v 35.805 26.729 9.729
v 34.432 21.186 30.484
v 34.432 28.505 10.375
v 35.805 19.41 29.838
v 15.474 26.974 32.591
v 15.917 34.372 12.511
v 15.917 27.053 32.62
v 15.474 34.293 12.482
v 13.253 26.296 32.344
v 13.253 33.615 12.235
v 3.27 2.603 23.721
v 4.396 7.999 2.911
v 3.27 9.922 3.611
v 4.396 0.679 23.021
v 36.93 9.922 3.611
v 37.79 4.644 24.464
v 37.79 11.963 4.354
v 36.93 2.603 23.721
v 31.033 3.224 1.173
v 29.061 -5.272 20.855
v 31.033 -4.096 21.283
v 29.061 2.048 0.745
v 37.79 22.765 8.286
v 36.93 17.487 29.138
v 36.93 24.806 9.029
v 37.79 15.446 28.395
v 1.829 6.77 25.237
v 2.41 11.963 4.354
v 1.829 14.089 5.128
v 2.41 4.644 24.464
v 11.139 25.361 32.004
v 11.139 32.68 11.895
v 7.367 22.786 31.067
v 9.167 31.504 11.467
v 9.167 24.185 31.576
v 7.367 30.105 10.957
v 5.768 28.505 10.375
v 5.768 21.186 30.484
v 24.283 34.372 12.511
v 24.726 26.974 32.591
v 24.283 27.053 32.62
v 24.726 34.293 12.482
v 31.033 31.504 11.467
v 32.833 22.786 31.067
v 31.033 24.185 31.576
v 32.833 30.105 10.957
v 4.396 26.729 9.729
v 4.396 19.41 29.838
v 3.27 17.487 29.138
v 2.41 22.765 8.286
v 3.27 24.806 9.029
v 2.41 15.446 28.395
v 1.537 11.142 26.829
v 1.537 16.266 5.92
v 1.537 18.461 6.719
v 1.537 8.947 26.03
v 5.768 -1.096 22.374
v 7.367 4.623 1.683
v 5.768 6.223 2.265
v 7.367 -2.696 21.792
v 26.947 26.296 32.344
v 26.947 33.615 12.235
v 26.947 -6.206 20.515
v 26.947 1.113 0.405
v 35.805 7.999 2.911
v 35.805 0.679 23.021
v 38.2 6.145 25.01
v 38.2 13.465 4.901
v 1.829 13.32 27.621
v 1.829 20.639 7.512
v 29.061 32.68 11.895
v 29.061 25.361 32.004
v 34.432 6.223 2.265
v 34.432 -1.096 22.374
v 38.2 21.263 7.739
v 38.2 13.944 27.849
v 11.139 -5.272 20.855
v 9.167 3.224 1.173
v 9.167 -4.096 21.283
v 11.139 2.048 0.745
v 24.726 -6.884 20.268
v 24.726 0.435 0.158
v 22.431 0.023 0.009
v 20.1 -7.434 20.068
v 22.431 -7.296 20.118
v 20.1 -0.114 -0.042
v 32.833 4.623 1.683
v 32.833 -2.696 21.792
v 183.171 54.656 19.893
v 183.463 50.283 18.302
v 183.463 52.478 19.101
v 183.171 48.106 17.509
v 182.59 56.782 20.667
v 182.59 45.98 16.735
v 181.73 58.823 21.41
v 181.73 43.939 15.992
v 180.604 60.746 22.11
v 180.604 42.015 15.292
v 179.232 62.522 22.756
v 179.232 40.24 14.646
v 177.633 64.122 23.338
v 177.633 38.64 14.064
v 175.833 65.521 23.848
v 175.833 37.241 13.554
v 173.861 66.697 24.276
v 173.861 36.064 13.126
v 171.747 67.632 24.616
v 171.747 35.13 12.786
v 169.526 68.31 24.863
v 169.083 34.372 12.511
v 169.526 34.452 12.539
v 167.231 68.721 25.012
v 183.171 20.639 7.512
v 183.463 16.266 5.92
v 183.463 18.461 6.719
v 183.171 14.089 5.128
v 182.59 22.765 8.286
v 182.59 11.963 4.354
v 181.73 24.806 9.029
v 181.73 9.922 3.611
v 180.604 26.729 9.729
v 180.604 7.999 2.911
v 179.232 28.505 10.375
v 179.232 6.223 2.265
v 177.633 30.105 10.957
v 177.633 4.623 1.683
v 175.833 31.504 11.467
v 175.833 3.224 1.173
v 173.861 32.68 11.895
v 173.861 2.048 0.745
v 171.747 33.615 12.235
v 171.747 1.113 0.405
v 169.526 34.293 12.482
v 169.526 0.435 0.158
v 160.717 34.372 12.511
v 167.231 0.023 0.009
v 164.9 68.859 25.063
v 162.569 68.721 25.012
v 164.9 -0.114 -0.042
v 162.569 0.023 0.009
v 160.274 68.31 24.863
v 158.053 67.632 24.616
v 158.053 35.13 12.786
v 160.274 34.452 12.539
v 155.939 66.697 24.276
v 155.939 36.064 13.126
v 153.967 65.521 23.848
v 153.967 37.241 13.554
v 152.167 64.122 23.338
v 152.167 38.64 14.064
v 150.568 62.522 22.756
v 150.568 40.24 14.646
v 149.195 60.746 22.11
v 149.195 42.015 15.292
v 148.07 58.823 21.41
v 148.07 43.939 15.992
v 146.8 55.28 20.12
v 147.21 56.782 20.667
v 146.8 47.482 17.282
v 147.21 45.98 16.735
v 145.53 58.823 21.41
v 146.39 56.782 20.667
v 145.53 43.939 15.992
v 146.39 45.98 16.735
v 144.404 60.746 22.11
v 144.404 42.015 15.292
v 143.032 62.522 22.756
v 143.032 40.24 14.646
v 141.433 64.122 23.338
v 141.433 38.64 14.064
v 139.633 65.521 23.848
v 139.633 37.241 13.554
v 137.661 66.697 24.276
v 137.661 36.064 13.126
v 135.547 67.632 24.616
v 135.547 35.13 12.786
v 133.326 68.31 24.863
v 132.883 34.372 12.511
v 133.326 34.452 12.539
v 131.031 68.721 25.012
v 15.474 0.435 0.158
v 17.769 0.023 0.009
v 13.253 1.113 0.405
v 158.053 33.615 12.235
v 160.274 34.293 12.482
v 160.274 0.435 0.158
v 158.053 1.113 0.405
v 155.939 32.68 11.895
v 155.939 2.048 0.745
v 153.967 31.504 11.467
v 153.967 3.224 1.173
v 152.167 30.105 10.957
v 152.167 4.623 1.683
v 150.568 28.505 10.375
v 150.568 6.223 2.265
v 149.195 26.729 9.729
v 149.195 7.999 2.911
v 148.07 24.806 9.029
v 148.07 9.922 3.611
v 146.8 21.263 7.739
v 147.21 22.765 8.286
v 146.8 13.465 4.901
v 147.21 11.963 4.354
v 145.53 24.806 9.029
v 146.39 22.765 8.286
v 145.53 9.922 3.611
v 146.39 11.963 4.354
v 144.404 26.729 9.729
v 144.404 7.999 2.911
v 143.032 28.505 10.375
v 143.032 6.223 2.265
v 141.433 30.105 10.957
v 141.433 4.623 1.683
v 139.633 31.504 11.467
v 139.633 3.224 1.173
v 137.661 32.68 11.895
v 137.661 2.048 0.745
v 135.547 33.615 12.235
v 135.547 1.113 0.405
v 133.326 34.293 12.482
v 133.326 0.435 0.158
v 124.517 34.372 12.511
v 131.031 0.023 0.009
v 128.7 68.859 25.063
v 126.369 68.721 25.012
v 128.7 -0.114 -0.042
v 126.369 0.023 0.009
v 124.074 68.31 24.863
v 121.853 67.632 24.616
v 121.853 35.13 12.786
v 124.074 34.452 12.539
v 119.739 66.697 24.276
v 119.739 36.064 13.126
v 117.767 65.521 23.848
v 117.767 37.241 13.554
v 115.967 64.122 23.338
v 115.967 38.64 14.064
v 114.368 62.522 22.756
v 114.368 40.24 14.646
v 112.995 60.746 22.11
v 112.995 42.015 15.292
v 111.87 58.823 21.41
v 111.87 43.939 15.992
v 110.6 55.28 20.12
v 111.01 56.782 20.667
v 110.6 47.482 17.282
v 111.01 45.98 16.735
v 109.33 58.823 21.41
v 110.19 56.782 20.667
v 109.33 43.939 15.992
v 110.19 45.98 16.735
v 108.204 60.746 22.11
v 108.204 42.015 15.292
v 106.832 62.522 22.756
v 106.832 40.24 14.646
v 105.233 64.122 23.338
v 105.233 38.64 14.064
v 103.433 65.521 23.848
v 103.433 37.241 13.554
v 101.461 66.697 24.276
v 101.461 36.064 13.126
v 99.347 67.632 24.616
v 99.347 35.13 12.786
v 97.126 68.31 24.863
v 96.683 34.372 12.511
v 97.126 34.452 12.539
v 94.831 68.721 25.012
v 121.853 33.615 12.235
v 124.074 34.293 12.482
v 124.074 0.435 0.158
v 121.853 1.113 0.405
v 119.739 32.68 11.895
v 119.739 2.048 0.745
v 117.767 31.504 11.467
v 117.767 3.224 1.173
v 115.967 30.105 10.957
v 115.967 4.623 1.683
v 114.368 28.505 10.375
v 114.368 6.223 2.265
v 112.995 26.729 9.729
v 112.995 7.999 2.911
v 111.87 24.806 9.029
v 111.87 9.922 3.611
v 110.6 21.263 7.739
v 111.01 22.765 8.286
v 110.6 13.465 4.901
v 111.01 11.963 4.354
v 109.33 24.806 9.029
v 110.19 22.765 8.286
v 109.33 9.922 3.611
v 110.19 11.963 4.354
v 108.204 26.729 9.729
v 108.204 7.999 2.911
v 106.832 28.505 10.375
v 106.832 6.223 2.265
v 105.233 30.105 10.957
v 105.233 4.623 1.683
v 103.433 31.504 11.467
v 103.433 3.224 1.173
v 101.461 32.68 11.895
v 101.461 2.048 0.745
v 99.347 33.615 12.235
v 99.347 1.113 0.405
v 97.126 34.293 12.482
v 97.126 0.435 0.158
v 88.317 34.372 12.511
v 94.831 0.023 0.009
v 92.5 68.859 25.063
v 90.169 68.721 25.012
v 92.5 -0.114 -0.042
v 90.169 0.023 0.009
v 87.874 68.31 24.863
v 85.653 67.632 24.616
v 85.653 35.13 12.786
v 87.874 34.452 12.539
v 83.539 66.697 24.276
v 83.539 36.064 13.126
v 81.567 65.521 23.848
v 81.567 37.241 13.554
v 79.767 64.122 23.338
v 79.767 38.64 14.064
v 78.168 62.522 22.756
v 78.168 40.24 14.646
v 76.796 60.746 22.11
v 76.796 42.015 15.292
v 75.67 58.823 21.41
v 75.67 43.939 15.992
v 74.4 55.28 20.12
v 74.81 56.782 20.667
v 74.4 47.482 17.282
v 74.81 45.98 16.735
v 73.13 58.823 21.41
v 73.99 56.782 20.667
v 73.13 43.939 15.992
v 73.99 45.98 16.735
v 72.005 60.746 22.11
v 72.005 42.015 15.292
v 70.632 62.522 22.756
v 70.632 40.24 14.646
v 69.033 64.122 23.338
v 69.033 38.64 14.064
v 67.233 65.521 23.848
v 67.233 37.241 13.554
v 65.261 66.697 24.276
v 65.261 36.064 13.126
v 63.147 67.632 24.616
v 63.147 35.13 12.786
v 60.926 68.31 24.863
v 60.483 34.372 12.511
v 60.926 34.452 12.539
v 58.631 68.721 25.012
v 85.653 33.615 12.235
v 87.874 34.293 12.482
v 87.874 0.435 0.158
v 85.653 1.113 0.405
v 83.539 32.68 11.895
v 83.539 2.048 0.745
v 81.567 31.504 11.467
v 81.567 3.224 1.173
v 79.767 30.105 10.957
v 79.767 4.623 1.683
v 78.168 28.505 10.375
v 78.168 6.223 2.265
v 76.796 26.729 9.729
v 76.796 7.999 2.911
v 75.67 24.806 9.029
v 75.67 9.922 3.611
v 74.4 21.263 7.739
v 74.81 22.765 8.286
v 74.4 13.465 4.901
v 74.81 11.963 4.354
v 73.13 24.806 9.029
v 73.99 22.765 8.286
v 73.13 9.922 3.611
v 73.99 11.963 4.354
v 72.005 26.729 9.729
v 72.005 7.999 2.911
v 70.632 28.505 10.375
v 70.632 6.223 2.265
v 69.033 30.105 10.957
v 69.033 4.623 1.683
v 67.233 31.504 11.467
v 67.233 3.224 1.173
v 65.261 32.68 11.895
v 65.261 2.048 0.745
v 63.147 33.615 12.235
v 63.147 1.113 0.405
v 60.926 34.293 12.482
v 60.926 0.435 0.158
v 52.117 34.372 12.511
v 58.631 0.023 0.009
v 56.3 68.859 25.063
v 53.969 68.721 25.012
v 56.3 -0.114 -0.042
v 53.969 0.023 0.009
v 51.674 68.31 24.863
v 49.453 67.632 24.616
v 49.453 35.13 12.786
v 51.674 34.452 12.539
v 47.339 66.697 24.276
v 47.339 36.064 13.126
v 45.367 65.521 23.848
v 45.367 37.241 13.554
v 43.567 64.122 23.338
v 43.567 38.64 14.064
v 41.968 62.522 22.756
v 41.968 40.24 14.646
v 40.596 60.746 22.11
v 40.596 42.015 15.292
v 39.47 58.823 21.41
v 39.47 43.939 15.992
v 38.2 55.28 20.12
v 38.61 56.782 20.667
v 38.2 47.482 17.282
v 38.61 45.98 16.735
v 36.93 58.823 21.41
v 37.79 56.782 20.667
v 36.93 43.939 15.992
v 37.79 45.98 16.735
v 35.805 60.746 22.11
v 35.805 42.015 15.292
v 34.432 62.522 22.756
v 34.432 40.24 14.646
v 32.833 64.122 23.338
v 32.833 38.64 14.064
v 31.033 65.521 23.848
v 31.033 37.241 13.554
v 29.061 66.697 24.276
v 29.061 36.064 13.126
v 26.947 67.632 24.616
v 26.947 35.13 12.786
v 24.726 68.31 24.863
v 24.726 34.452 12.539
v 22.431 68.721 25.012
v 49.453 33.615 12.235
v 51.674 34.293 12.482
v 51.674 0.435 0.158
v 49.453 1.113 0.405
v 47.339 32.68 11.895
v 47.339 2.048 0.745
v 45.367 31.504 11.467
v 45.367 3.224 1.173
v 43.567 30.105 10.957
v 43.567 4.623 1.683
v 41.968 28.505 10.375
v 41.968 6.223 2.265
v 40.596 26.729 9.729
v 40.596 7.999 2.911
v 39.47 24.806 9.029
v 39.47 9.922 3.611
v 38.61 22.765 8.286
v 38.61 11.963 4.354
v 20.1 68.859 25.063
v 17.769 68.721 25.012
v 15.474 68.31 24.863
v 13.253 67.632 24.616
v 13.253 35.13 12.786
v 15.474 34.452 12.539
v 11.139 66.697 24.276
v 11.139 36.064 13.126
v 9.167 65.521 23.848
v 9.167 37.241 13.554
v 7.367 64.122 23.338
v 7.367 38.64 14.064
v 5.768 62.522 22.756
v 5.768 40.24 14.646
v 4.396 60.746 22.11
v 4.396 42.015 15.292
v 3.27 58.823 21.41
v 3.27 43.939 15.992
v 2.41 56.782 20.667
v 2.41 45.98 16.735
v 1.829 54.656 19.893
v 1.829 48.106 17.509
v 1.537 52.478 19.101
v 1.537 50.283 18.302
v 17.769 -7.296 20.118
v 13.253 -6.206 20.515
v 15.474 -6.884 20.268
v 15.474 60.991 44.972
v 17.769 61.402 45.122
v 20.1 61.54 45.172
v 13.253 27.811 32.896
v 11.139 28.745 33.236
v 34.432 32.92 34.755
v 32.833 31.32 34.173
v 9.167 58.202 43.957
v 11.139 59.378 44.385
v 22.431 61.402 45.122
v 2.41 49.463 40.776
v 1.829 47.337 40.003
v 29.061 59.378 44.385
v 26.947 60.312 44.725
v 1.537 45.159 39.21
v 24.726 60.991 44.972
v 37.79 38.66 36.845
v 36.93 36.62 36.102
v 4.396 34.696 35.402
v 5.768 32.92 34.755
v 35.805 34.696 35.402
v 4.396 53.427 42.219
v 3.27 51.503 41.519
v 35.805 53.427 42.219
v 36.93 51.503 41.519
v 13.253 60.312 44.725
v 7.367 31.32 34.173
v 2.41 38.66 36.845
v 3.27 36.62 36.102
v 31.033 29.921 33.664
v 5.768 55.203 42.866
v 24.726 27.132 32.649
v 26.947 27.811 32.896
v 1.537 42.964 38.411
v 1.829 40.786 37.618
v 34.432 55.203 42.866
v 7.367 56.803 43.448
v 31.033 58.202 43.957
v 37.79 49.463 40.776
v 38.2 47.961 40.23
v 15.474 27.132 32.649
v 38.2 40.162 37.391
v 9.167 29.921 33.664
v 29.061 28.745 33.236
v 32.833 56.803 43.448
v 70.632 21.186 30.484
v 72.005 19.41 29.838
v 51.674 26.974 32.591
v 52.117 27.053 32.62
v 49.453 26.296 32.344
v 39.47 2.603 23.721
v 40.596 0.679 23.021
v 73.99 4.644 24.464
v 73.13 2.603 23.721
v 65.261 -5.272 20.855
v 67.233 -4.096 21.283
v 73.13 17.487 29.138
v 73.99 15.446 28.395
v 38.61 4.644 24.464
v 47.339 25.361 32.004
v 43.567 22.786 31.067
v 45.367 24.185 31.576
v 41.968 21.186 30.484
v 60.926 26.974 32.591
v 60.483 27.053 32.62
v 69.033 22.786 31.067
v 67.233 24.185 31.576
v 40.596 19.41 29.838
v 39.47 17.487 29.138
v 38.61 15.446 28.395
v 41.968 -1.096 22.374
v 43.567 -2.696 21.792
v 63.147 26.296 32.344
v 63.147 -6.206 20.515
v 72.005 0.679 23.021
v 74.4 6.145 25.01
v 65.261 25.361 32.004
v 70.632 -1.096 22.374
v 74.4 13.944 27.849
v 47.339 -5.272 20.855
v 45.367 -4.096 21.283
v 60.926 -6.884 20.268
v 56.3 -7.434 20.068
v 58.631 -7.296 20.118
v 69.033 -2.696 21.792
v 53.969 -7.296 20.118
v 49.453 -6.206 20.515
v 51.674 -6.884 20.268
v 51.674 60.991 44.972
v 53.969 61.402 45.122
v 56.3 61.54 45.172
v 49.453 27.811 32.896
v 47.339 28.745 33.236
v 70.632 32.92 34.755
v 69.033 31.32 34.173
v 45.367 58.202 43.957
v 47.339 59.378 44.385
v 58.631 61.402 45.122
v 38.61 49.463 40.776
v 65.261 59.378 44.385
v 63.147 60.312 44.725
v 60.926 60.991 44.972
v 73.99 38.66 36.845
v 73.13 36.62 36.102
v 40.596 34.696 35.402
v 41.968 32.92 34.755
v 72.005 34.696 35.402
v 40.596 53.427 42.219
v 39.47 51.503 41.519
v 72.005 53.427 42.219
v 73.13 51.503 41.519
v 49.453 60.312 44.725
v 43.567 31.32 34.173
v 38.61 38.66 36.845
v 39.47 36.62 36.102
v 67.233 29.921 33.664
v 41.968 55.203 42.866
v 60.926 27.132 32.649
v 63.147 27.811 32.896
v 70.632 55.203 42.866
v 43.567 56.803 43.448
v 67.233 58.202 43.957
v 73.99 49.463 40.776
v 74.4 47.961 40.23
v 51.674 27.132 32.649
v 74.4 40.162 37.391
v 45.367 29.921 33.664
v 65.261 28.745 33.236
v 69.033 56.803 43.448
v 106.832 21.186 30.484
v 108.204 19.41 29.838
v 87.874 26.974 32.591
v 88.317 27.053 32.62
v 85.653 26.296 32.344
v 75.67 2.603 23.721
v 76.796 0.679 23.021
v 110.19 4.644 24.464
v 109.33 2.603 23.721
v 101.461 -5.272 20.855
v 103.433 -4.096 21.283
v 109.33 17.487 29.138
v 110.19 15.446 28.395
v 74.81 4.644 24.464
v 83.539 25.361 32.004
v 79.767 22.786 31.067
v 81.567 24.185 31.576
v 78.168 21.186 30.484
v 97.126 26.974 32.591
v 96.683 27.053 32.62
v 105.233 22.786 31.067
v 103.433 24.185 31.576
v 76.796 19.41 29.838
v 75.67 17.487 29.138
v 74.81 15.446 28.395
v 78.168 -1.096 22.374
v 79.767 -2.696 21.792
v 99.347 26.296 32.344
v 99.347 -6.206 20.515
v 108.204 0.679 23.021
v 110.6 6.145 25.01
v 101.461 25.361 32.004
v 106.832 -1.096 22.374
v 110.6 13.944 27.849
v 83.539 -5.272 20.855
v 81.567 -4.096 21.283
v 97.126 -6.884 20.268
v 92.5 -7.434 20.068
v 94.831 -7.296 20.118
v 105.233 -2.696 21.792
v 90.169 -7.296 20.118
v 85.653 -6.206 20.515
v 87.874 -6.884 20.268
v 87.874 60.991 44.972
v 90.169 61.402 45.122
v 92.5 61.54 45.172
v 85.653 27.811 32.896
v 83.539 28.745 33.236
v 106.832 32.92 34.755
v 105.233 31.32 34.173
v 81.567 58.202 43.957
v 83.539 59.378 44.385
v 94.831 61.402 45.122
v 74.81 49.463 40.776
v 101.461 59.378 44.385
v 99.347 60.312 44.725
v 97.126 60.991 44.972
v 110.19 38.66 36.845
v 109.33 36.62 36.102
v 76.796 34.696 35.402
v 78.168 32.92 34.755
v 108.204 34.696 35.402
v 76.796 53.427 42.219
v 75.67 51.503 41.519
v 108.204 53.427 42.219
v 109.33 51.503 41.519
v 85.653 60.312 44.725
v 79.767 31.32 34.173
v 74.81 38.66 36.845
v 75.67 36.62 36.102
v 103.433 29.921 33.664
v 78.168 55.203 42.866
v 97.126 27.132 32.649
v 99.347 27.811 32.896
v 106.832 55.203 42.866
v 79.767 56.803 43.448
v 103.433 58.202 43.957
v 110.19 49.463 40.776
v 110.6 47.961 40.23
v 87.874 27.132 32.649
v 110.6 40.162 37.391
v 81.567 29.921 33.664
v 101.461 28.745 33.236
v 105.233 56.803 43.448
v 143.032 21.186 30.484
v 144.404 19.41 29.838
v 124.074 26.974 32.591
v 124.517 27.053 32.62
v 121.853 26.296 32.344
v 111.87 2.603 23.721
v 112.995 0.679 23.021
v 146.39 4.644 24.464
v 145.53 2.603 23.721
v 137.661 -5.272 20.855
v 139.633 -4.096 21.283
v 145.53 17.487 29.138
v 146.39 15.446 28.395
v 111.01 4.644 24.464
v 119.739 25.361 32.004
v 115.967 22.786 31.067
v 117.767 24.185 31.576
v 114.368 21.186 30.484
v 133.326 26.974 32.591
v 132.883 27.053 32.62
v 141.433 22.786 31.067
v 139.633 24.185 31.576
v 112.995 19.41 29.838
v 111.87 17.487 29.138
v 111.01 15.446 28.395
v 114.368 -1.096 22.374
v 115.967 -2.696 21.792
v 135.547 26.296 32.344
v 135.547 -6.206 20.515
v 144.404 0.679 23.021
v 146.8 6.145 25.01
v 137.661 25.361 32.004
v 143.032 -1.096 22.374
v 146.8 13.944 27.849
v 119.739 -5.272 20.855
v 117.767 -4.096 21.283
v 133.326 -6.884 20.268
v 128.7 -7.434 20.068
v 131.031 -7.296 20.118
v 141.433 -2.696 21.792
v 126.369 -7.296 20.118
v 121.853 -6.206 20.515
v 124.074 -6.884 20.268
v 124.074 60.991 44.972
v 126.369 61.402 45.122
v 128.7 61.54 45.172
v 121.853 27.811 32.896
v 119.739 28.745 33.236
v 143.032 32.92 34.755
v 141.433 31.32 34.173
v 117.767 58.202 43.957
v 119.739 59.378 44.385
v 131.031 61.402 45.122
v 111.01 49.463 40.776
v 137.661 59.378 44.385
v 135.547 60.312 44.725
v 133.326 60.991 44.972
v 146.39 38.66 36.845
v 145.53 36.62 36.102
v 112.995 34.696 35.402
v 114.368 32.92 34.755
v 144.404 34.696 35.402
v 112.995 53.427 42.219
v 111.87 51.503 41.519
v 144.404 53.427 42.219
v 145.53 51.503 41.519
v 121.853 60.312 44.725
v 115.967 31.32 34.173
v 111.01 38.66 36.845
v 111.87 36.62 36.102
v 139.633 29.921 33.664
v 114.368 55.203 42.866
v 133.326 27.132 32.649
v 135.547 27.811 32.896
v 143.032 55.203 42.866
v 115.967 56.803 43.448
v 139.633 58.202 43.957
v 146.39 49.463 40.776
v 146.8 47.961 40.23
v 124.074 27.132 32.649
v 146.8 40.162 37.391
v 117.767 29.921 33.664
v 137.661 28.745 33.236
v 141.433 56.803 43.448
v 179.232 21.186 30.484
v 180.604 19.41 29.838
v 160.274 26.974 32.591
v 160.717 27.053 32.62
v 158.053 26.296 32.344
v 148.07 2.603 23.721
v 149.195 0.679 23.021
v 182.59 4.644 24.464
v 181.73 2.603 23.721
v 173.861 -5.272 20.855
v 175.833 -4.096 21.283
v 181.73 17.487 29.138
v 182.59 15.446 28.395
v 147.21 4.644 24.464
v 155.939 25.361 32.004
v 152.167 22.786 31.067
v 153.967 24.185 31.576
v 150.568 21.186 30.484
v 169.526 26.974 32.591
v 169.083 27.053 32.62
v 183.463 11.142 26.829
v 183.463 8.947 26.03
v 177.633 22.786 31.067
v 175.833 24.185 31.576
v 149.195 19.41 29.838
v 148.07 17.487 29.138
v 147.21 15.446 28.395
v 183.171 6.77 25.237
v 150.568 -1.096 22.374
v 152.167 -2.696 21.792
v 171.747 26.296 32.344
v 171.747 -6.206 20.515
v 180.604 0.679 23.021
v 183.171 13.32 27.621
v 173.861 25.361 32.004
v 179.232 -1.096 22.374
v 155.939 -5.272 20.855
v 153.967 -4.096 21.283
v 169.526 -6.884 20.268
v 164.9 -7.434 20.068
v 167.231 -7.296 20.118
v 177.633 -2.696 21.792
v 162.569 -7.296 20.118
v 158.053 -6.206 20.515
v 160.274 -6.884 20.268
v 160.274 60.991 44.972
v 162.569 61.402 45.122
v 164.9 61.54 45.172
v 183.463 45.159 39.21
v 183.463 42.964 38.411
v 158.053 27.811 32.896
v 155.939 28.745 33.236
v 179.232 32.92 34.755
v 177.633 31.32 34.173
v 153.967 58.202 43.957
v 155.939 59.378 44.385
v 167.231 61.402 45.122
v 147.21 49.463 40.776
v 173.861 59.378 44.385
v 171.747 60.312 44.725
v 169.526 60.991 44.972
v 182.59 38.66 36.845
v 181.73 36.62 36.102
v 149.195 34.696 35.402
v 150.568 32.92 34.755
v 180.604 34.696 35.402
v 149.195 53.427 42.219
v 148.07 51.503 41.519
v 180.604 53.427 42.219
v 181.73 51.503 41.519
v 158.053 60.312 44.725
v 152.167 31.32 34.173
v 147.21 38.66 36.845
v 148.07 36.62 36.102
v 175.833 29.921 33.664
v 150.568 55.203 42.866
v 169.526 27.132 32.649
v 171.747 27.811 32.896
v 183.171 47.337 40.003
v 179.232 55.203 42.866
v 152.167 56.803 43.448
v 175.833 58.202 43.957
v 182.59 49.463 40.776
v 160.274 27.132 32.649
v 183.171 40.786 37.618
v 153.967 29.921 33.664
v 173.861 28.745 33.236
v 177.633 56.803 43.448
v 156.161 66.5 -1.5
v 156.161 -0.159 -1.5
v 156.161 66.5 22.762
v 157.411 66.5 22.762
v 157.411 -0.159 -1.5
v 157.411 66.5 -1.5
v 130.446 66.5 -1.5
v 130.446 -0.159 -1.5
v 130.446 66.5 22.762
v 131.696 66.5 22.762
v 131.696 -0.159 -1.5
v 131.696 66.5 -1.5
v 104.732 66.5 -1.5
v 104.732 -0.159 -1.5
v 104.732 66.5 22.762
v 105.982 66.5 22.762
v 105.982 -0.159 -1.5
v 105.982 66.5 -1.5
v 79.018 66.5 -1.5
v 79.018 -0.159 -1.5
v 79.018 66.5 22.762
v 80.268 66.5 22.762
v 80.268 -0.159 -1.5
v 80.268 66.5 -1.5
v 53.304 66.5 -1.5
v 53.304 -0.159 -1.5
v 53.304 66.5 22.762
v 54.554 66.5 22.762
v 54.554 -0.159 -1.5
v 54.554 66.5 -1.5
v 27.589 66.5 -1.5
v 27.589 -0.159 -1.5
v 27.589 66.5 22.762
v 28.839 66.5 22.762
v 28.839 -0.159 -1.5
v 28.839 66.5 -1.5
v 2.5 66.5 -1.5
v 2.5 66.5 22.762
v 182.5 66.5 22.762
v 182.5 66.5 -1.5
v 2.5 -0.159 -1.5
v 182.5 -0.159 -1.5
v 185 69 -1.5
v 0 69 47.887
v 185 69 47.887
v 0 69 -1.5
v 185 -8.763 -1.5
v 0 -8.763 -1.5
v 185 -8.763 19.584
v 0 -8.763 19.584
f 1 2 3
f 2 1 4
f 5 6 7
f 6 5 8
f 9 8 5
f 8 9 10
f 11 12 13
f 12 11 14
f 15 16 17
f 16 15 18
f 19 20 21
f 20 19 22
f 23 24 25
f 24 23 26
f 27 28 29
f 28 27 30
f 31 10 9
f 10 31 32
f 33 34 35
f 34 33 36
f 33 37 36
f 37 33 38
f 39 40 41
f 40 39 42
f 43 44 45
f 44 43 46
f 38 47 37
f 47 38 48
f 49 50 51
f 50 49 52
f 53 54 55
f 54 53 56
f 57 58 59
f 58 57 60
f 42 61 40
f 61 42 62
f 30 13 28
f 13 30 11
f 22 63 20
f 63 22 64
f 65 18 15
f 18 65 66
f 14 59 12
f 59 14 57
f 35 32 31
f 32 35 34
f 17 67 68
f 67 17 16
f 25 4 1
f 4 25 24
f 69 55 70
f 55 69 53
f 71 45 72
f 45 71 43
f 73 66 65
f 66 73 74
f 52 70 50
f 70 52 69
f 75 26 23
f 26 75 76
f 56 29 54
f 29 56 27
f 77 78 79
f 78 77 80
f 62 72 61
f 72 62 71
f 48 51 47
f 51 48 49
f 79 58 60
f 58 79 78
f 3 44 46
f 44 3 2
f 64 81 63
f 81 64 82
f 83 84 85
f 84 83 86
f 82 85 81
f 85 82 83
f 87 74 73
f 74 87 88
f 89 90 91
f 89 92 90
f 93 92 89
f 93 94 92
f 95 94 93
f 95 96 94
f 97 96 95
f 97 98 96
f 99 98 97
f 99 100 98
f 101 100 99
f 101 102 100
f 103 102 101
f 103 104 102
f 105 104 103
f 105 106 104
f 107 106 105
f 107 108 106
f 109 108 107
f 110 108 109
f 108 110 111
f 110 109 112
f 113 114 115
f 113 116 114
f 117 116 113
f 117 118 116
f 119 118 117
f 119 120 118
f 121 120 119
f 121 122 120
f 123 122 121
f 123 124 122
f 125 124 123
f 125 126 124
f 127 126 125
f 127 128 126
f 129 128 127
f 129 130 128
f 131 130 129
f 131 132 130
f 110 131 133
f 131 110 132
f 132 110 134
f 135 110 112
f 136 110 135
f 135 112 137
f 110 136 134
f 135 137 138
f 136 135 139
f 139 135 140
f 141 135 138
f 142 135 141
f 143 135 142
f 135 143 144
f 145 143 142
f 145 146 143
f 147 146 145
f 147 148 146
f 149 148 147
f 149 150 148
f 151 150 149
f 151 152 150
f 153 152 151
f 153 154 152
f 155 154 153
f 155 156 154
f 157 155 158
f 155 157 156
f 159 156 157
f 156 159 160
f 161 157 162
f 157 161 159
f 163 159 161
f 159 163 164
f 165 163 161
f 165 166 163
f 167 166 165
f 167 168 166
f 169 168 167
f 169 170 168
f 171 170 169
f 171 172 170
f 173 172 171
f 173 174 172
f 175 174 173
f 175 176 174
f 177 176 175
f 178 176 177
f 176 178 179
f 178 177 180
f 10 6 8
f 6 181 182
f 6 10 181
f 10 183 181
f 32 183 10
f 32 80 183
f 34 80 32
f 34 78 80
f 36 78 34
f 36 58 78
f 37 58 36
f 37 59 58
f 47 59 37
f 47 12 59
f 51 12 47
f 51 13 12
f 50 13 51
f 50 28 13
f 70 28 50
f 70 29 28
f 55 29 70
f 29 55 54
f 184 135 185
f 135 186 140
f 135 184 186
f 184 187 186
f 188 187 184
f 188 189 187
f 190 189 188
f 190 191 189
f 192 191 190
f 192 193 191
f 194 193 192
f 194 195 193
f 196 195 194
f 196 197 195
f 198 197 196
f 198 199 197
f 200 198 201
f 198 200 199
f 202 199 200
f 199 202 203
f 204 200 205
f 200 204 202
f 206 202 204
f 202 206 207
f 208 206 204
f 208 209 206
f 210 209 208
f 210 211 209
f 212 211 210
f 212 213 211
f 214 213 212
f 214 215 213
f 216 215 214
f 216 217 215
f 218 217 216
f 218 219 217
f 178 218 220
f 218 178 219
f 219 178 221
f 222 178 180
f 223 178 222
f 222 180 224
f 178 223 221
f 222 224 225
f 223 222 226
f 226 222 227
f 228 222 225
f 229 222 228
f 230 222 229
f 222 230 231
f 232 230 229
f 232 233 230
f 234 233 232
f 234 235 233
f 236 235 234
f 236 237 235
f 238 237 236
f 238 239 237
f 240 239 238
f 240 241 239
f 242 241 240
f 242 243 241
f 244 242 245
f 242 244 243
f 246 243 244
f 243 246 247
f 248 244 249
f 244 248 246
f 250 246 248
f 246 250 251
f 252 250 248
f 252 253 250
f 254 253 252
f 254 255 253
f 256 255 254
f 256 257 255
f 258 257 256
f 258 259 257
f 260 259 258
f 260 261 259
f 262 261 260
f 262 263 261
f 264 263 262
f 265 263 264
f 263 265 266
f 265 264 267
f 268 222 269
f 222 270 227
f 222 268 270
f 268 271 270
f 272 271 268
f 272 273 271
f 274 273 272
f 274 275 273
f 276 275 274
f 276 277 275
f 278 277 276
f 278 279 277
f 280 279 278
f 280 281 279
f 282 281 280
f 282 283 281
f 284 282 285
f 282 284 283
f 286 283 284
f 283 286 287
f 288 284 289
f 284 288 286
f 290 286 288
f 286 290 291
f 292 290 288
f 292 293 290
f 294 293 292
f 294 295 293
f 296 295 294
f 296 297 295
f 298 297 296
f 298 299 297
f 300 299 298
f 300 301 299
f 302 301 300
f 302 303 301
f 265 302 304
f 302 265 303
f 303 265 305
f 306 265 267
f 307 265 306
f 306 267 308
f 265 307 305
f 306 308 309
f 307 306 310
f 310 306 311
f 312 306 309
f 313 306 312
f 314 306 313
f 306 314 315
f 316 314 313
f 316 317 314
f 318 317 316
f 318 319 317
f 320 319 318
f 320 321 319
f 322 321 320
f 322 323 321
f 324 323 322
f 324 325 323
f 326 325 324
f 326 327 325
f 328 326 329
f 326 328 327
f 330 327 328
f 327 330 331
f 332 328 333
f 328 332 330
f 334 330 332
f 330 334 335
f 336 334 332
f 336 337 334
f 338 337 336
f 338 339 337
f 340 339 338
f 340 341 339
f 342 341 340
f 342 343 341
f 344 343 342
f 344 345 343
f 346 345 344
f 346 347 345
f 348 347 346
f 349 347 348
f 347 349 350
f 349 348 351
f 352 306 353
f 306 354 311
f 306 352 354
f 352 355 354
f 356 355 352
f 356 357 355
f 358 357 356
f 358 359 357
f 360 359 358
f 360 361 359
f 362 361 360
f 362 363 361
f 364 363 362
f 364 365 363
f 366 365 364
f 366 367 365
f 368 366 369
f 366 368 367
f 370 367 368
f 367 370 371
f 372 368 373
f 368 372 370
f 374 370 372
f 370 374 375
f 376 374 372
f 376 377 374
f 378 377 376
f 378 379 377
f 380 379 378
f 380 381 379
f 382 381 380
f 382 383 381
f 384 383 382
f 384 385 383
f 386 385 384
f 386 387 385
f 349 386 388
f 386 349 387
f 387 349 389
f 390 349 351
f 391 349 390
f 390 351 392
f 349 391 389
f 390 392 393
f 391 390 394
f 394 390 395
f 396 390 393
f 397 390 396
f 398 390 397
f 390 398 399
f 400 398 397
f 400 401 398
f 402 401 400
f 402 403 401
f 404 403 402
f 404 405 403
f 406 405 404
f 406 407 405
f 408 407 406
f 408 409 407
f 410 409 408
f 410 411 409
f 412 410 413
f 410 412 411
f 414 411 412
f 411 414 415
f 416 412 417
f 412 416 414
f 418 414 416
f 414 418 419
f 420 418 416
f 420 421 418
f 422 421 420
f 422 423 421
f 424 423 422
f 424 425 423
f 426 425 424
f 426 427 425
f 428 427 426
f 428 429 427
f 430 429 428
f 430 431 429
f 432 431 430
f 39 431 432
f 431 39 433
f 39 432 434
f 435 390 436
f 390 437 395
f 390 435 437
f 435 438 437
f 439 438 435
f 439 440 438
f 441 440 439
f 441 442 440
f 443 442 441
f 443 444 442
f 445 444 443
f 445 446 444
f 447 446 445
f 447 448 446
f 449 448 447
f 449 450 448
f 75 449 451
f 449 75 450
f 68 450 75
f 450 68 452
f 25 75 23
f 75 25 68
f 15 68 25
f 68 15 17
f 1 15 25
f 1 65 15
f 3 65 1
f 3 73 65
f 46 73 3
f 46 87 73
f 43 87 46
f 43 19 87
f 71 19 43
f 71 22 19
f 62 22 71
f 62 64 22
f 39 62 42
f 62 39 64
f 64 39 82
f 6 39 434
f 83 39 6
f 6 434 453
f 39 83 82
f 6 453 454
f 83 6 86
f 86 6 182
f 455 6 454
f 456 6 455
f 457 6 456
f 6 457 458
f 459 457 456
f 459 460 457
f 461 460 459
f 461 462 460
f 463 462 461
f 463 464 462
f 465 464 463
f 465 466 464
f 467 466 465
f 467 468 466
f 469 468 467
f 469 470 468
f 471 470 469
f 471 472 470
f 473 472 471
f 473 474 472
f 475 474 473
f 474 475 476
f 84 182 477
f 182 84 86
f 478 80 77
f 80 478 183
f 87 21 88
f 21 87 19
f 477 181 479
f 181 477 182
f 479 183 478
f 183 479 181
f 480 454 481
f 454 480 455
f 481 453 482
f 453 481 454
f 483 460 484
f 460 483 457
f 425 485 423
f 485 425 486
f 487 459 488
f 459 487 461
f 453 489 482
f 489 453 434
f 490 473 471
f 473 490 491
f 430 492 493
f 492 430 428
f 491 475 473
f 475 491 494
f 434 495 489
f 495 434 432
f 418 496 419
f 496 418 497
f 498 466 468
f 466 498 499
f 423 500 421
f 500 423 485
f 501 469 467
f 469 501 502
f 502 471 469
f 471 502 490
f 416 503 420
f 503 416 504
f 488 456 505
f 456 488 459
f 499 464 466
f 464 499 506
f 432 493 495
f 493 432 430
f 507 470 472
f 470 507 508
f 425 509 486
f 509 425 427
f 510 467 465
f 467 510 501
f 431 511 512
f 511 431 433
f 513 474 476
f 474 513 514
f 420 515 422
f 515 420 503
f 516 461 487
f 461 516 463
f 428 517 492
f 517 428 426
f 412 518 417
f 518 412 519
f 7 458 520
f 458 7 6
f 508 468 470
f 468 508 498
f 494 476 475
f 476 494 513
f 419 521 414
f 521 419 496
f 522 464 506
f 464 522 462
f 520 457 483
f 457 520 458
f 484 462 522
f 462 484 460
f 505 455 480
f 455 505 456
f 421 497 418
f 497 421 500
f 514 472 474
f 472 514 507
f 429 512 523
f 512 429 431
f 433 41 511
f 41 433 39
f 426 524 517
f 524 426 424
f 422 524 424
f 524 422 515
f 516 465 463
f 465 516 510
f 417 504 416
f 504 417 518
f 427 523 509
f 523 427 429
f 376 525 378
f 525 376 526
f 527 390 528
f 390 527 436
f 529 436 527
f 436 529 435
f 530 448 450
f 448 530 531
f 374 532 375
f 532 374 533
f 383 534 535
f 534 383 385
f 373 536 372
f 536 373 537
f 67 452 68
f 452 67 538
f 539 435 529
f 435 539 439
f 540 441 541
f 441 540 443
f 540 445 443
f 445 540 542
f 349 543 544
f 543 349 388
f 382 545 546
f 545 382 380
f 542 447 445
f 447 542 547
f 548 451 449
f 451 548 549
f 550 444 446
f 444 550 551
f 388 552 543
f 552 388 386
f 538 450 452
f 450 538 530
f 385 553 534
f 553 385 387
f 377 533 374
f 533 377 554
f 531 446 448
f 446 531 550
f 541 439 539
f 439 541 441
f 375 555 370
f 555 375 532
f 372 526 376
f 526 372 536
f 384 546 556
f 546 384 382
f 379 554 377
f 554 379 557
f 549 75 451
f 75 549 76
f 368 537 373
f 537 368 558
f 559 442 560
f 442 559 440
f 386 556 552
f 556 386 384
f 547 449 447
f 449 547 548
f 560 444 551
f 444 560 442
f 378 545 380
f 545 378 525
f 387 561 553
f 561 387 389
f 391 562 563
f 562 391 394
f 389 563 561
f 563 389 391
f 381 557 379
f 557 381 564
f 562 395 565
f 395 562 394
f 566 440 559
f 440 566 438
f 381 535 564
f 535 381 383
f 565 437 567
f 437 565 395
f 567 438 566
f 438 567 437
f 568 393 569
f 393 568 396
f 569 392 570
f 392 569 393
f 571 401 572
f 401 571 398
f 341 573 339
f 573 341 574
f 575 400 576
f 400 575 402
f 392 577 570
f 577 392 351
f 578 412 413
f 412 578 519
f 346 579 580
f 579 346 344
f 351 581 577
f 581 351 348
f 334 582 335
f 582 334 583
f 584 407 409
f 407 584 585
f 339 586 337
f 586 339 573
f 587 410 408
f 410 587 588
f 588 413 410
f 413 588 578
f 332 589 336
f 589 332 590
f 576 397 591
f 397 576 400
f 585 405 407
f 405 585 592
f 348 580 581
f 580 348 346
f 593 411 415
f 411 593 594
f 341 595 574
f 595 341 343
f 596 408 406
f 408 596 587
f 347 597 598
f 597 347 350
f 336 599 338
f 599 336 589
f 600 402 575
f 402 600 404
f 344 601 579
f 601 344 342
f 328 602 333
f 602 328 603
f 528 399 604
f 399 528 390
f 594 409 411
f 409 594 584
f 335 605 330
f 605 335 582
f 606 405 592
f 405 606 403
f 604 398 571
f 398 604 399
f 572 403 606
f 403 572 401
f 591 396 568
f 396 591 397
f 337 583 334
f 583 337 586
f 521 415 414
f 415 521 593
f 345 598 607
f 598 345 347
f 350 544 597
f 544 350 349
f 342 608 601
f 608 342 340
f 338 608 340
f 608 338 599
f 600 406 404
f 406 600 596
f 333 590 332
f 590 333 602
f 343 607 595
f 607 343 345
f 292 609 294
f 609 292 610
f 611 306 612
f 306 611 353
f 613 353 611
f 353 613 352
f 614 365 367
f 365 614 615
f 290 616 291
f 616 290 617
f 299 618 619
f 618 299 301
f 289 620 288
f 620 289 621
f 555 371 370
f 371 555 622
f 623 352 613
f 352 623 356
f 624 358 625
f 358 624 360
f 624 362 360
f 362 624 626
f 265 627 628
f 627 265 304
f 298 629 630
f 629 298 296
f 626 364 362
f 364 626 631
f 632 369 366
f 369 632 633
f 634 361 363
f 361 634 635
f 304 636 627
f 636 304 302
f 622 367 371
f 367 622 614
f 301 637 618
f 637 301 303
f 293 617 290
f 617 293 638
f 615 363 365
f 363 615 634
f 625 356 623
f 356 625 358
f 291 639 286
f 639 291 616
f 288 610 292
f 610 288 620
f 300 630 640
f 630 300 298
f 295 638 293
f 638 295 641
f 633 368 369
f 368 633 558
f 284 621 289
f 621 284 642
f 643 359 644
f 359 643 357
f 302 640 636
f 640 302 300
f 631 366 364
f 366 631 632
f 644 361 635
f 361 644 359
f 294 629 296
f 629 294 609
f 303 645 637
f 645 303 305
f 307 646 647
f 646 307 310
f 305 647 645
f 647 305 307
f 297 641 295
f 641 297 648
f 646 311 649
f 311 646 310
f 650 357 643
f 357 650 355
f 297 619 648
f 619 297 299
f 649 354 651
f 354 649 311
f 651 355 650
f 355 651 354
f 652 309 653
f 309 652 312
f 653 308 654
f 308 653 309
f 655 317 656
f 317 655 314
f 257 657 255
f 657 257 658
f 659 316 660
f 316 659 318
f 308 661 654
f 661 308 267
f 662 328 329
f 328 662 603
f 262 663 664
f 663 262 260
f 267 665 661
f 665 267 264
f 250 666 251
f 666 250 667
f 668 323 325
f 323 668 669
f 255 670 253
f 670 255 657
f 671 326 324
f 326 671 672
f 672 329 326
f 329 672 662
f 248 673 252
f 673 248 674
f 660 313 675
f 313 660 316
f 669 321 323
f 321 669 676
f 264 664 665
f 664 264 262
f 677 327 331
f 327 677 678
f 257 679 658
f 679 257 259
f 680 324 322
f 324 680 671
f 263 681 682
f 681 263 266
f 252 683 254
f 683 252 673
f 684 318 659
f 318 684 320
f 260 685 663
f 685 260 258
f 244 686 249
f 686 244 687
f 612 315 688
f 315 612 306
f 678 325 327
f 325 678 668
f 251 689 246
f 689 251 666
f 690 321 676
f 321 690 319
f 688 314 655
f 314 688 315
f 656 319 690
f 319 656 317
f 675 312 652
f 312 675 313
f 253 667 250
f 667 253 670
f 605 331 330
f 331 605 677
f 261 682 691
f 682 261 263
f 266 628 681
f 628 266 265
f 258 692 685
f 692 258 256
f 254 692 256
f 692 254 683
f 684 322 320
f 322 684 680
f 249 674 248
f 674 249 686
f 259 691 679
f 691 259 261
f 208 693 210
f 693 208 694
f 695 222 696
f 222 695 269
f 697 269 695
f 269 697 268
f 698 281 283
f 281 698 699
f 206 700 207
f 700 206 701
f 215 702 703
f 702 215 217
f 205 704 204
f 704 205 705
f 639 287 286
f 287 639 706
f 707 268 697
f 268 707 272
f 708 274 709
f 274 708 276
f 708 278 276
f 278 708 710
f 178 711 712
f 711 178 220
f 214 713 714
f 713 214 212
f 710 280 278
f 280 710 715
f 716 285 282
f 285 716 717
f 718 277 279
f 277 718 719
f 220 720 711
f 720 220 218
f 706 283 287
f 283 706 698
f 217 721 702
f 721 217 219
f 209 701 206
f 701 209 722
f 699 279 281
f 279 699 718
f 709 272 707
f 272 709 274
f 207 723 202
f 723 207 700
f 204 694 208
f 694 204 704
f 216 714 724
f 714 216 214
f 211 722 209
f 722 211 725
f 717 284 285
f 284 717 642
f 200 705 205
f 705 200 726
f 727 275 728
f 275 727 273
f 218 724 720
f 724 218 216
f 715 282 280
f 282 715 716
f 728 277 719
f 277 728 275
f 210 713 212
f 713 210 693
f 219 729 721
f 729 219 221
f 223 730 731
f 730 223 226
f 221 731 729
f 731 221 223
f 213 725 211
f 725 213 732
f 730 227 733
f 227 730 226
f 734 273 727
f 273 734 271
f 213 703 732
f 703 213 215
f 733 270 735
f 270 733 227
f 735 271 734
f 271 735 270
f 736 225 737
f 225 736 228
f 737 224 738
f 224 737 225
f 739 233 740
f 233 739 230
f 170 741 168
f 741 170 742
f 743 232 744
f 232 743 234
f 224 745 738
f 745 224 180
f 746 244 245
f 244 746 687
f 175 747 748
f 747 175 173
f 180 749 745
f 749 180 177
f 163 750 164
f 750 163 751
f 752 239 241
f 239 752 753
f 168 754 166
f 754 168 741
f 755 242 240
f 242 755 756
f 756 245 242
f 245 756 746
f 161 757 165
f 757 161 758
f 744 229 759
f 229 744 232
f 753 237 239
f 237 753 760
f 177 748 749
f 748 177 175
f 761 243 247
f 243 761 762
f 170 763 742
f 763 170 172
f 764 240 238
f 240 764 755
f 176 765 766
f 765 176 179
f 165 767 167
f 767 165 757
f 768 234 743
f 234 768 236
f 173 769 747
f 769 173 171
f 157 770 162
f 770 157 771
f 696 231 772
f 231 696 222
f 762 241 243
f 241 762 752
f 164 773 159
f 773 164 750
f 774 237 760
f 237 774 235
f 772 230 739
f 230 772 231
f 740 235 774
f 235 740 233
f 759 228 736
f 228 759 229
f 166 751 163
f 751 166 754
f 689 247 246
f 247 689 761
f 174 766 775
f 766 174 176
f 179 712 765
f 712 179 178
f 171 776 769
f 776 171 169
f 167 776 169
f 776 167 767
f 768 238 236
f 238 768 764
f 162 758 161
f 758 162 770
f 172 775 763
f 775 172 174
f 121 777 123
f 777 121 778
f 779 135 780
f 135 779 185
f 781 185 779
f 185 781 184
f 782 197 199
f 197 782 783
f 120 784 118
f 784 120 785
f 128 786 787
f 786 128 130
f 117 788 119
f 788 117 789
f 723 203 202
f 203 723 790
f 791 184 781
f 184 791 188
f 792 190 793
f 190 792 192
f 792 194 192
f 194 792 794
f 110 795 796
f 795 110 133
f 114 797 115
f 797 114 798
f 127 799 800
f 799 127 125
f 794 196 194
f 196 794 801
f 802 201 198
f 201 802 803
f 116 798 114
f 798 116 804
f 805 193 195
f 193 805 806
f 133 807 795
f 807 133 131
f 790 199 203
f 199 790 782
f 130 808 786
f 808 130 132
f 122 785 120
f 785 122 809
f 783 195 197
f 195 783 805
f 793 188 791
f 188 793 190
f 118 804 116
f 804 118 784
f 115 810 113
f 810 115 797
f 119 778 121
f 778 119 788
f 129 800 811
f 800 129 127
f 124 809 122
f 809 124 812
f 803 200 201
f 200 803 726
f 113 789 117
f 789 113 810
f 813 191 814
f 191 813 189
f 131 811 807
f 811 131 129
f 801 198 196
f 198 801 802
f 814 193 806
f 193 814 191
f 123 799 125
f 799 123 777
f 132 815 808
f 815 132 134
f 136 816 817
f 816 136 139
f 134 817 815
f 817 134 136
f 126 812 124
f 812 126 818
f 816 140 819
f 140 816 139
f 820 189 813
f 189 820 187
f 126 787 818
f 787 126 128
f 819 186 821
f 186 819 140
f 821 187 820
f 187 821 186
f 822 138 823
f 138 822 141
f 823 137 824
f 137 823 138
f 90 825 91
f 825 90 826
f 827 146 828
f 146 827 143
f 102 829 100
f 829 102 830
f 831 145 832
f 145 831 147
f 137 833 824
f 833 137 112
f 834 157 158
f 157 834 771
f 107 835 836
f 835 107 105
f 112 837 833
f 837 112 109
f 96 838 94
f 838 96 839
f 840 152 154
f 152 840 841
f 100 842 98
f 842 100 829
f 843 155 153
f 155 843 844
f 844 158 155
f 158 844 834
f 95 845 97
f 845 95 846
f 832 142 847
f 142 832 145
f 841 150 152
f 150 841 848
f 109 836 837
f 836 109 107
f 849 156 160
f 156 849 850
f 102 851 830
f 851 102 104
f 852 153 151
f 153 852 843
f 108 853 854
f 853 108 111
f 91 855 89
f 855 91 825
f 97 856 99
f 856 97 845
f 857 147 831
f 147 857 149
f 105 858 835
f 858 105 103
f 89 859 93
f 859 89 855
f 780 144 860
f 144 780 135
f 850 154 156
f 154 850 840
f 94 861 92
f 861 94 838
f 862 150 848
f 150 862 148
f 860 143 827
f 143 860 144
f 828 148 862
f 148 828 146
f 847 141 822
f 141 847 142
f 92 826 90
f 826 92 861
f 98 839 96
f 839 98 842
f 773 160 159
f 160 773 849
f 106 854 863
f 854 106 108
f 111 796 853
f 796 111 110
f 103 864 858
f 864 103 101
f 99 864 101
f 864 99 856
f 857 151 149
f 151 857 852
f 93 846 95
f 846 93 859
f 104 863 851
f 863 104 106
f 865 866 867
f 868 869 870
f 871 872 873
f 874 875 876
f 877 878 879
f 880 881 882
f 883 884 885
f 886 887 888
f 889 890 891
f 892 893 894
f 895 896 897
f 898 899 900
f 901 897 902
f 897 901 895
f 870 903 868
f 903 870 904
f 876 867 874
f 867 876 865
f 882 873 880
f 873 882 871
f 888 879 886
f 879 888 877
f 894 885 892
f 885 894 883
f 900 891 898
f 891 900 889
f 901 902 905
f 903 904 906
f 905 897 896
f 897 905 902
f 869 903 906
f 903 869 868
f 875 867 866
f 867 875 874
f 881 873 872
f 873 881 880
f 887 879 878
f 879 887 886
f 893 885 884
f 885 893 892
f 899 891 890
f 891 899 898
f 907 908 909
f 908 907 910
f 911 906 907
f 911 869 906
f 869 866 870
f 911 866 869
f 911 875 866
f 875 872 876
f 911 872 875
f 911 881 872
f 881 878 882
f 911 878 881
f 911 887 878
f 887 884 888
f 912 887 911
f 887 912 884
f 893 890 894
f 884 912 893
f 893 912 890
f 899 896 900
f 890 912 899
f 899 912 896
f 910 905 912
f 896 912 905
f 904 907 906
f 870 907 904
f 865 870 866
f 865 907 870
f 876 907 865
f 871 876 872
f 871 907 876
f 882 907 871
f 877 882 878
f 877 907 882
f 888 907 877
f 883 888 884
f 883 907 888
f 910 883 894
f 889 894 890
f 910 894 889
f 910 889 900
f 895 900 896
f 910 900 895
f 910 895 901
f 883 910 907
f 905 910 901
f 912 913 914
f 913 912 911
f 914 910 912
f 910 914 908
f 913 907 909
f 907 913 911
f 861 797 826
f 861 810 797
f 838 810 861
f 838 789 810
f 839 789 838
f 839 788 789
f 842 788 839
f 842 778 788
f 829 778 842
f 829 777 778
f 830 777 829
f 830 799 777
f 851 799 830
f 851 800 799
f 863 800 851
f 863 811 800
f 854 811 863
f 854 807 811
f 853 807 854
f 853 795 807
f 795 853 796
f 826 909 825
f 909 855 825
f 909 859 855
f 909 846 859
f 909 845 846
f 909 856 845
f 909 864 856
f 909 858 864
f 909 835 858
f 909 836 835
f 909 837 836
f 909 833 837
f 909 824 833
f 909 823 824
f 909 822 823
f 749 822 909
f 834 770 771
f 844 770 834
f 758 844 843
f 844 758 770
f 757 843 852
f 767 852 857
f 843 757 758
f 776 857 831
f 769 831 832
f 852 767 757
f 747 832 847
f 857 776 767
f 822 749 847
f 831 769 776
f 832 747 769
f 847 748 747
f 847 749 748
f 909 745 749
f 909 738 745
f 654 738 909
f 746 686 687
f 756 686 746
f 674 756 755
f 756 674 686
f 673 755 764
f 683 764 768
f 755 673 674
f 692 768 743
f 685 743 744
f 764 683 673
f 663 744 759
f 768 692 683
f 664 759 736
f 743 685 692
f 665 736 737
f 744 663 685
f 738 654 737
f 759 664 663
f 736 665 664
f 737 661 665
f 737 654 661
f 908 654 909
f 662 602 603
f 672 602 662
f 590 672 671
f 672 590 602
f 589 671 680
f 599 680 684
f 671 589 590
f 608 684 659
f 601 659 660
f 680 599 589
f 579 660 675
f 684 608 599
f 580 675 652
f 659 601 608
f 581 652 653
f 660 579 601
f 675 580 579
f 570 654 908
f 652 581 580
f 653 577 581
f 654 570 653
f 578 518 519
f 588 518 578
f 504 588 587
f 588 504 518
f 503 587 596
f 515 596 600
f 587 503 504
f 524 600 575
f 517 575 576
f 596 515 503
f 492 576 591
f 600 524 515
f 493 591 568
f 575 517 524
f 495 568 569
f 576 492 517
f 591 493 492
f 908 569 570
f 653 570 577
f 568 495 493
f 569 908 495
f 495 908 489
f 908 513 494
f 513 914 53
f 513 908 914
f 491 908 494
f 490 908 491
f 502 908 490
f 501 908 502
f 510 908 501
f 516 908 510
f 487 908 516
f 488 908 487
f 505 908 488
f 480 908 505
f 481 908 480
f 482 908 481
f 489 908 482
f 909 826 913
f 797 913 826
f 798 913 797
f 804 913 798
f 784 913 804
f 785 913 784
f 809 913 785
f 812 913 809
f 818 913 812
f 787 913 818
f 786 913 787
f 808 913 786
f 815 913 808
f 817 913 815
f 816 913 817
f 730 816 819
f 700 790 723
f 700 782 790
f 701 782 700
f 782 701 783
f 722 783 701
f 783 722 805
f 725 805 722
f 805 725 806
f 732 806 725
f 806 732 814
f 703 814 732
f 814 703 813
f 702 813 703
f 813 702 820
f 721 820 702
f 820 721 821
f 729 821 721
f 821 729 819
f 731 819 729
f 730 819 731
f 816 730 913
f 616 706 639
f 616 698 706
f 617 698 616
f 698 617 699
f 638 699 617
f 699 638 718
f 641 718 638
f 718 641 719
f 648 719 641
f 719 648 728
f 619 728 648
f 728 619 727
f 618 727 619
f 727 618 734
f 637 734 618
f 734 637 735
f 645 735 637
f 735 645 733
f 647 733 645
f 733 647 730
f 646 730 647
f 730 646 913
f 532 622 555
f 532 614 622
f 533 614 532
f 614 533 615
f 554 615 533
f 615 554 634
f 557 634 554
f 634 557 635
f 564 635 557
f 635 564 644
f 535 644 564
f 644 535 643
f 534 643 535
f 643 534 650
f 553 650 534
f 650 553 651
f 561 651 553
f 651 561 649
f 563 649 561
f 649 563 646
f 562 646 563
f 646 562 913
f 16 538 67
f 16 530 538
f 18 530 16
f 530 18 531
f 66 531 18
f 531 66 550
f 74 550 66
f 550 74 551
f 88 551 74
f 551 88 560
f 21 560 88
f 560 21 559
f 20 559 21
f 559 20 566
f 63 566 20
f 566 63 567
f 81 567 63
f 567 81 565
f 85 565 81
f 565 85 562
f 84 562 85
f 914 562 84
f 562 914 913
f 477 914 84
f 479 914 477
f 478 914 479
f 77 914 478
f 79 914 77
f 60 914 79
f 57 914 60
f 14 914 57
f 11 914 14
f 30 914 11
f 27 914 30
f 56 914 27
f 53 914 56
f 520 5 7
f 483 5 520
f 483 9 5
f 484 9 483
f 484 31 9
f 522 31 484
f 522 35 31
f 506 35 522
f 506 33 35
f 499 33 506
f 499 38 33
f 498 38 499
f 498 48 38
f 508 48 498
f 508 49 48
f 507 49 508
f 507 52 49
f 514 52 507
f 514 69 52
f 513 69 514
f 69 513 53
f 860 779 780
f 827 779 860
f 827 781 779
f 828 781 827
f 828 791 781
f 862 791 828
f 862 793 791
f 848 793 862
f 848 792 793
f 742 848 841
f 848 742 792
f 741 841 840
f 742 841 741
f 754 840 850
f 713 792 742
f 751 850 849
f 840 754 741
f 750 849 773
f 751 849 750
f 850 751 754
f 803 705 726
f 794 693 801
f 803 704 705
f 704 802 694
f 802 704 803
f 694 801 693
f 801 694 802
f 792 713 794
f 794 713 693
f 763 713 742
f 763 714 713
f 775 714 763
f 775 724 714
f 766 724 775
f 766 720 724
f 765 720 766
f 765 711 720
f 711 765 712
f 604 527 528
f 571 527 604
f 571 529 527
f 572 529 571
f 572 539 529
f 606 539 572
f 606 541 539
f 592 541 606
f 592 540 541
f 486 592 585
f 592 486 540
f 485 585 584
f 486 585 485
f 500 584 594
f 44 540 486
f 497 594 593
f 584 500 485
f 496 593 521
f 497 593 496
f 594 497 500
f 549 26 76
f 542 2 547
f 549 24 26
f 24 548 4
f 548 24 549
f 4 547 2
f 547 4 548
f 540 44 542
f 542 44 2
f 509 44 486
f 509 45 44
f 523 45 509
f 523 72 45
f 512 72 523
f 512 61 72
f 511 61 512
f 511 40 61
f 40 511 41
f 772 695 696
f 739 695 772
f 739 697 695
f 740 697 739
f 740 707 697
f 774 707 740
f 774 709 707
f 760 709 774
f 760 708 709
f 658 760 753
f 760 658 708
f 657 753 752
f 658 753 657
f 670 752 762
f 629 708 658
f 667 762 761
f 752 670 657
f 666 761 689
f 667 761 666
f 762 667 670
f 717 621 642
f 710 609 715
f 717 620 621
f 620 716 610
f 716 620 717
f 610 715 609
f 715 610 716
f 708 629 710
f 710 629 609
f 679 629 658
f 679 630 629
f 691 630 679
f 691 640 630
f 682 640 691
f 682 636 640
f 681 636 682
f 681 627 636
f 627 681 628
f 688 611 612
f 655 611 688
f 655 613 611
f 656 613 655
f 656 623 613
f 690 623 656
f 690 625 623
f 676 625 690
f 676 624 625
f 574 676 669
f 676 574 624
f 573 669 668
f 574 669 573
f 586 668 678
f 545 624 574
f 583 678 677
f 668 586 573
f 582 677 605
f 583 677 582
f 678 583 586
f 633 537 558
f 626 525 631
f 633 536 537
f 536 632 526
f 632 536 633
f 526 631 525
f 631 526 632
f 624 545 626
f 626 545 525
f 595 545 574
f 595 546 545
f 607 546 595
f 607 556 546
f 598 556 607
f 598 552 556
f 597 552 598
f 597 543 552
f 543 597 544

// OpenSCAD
/* [Global] */

/*[Container Size]*/

//Number of column
column = 2;  //[1:20]
//Number of row
row = 5; //[1:20]
//Degree of the slope
deg = 20;  //[0:25]
//Rendering of 3D model
object = 0;  //[0:Container,1:Container+Cover, 2:Container+Cover+Clip, 3:Clip ]
//Thickness of the plastic cover
coverThick = 1.2;


/*[Bottle Size]*/

//Diameter of each bottle
diameter = 35.5;
//Height of each bottle
bottleH = 42;
//Deepness of each bottle hole
holeH = 21.5;

/*[Advanced]*/
//Thickness of the container edge
space = 1.5;
//Duplicating area of each hole
offset = 1;
//Spacing of each hole against diameter of bottle
holespace = 1.7;
//Support thickness at the bottom
minusThick = 2.5;

/* [Hidden] */

holeDiameter = diameter + holespace ;

x = sqrt(space*space + holeH*holeH) * cos(90-deg-atan(space/holeH));
y = round((holeDiameter*column - offset*(column-1) +space/3) * cos(deg));

totalW = holeDiameter*row-offset*(row-1) + space*2 ;
totalH = ((holeDiameter-offset)*column+18)*sin(deg)+holeH;
totalD = x + y;



module Body(){
    
difference()
{

totalHW = (holeDiameter+3) * row ;

translate([-x,-totalW,-space,])
cube([totalD,totalW,totalH]);

rotate([0,-deg,0])
translate([-x*2,-(holeDiameter/2-2)*3*row,holeH-0.1])
cube([holeDiameter*column*2,(holeDiameter+4)*1.5*row, holeDiameter*column*cos(deg)]);

translate([0 ,-(holeDiameter)/2 - space,0])
rotate([0,-deg,0])
translate([holeDiameter/2*cos(deg)+1,0,0])
    {
for ( i = [0 : row-1 ] ){
translate([0,-(holeDiameter-offset)*i,0,])  
for ( i = [0 : column-1 ] ){
translate([(holeDiameter-offset)*i,0,0,])
cylinder(h = holeH*2, r=holeDiameter/2, $fn=50);     
 }
 }
 }
 
translate([minusThick,minusThick,0])
difference()
{
translate([-x,-totalW,-space-0.1,])
cube([totalD-minusThick*2,totalW-minusThick*2,totalH]);
 
rotate([0,-deg,0])
translate([-x*2,-(holeDiameter/2-2)*3*row,-space/3])
cube([holeDiameter*column*2,(holeDiameter+4)*1.5*row, holeDiameter*column*cos(deg)]);    

translate([-x,-totalW,-space-0.1,]){
for ( i = [1 : row+1 ] ){
translate([0.1,i*(totalW-minusThick*2)/(row+2)-minusThick/2/2,0])
cube([totalD-minusThick*2,minusThick/2,totalH]);   
}
}
}
}
    
}


module cover(){
    
    translate([-x+totalD,-totalW,holeH+sin(deg)*(holeDiameter*column-offset*(column-1)+space*2.2)-0.2])
    mirror([1,0,0])
rotate([0,deg,0]){
cube([5,totalW,bottleH-holeH]);

////hinge
translate([0,0,bottleH-holeH]){
difference(){ 
cube([5,2,5]); 
rotate([90,0,0])
translate([2.5,2.5,-2.5])
cylinder(h = 3, r=2.7/2, $fn=30);
}
translate([0,totalW-2,0])
difference(){ 
cube([5,2,5]); 
rotate([90,0,0])
translate([2.5,2.5,-2.5])
cylinder(h = 3, r=2.7/2, $fn=30);
}
}   



}
    
}


module coverClip(deg){
if (object == 2 || object ==3) {
translate([-x+totalD,-totalW,holeH+sin(deg)*(holeDiameter*column-offset*(column-1)+space*2.2)-0.2]) mirror([1,0,0]) 

    rotate([0,deg,0])
    {
    
translate([0,0,bottleH-holeH]){
    
translate([1.5,2+2/2,1.5])
difference(){ 
    translate([0,0,-(3.5-2)/2])
    cube([11,totalW-2*2-1,3.5]);
    translate([5,-1,1-coverThick/2])
    cube([9,(totalW-2*2)+2,coverThick]); 
}  
 
rotate([90,0,0])
translate([2.25+1,2.5,-2.5]){
    translate([0,0,-0.5])
    cylinder(h = 1.3, r=1.5/2, $fn=6);
    translate([0,0,0.5-(totalW-2*2)])
    mirror([0,0,1])
    cylinder(h = 1, r=1.4/2, $fn=6);
}
}
}
}

}

///////main///////

rotate([0,0,90]) {
if (object ==0 || object ==1 || object ==2)
Body();

if (object == 1 || object ==2) 
cover();

if (object ==3)
coverClip(0);
if (object ==2)
coverClip(deg);

}
